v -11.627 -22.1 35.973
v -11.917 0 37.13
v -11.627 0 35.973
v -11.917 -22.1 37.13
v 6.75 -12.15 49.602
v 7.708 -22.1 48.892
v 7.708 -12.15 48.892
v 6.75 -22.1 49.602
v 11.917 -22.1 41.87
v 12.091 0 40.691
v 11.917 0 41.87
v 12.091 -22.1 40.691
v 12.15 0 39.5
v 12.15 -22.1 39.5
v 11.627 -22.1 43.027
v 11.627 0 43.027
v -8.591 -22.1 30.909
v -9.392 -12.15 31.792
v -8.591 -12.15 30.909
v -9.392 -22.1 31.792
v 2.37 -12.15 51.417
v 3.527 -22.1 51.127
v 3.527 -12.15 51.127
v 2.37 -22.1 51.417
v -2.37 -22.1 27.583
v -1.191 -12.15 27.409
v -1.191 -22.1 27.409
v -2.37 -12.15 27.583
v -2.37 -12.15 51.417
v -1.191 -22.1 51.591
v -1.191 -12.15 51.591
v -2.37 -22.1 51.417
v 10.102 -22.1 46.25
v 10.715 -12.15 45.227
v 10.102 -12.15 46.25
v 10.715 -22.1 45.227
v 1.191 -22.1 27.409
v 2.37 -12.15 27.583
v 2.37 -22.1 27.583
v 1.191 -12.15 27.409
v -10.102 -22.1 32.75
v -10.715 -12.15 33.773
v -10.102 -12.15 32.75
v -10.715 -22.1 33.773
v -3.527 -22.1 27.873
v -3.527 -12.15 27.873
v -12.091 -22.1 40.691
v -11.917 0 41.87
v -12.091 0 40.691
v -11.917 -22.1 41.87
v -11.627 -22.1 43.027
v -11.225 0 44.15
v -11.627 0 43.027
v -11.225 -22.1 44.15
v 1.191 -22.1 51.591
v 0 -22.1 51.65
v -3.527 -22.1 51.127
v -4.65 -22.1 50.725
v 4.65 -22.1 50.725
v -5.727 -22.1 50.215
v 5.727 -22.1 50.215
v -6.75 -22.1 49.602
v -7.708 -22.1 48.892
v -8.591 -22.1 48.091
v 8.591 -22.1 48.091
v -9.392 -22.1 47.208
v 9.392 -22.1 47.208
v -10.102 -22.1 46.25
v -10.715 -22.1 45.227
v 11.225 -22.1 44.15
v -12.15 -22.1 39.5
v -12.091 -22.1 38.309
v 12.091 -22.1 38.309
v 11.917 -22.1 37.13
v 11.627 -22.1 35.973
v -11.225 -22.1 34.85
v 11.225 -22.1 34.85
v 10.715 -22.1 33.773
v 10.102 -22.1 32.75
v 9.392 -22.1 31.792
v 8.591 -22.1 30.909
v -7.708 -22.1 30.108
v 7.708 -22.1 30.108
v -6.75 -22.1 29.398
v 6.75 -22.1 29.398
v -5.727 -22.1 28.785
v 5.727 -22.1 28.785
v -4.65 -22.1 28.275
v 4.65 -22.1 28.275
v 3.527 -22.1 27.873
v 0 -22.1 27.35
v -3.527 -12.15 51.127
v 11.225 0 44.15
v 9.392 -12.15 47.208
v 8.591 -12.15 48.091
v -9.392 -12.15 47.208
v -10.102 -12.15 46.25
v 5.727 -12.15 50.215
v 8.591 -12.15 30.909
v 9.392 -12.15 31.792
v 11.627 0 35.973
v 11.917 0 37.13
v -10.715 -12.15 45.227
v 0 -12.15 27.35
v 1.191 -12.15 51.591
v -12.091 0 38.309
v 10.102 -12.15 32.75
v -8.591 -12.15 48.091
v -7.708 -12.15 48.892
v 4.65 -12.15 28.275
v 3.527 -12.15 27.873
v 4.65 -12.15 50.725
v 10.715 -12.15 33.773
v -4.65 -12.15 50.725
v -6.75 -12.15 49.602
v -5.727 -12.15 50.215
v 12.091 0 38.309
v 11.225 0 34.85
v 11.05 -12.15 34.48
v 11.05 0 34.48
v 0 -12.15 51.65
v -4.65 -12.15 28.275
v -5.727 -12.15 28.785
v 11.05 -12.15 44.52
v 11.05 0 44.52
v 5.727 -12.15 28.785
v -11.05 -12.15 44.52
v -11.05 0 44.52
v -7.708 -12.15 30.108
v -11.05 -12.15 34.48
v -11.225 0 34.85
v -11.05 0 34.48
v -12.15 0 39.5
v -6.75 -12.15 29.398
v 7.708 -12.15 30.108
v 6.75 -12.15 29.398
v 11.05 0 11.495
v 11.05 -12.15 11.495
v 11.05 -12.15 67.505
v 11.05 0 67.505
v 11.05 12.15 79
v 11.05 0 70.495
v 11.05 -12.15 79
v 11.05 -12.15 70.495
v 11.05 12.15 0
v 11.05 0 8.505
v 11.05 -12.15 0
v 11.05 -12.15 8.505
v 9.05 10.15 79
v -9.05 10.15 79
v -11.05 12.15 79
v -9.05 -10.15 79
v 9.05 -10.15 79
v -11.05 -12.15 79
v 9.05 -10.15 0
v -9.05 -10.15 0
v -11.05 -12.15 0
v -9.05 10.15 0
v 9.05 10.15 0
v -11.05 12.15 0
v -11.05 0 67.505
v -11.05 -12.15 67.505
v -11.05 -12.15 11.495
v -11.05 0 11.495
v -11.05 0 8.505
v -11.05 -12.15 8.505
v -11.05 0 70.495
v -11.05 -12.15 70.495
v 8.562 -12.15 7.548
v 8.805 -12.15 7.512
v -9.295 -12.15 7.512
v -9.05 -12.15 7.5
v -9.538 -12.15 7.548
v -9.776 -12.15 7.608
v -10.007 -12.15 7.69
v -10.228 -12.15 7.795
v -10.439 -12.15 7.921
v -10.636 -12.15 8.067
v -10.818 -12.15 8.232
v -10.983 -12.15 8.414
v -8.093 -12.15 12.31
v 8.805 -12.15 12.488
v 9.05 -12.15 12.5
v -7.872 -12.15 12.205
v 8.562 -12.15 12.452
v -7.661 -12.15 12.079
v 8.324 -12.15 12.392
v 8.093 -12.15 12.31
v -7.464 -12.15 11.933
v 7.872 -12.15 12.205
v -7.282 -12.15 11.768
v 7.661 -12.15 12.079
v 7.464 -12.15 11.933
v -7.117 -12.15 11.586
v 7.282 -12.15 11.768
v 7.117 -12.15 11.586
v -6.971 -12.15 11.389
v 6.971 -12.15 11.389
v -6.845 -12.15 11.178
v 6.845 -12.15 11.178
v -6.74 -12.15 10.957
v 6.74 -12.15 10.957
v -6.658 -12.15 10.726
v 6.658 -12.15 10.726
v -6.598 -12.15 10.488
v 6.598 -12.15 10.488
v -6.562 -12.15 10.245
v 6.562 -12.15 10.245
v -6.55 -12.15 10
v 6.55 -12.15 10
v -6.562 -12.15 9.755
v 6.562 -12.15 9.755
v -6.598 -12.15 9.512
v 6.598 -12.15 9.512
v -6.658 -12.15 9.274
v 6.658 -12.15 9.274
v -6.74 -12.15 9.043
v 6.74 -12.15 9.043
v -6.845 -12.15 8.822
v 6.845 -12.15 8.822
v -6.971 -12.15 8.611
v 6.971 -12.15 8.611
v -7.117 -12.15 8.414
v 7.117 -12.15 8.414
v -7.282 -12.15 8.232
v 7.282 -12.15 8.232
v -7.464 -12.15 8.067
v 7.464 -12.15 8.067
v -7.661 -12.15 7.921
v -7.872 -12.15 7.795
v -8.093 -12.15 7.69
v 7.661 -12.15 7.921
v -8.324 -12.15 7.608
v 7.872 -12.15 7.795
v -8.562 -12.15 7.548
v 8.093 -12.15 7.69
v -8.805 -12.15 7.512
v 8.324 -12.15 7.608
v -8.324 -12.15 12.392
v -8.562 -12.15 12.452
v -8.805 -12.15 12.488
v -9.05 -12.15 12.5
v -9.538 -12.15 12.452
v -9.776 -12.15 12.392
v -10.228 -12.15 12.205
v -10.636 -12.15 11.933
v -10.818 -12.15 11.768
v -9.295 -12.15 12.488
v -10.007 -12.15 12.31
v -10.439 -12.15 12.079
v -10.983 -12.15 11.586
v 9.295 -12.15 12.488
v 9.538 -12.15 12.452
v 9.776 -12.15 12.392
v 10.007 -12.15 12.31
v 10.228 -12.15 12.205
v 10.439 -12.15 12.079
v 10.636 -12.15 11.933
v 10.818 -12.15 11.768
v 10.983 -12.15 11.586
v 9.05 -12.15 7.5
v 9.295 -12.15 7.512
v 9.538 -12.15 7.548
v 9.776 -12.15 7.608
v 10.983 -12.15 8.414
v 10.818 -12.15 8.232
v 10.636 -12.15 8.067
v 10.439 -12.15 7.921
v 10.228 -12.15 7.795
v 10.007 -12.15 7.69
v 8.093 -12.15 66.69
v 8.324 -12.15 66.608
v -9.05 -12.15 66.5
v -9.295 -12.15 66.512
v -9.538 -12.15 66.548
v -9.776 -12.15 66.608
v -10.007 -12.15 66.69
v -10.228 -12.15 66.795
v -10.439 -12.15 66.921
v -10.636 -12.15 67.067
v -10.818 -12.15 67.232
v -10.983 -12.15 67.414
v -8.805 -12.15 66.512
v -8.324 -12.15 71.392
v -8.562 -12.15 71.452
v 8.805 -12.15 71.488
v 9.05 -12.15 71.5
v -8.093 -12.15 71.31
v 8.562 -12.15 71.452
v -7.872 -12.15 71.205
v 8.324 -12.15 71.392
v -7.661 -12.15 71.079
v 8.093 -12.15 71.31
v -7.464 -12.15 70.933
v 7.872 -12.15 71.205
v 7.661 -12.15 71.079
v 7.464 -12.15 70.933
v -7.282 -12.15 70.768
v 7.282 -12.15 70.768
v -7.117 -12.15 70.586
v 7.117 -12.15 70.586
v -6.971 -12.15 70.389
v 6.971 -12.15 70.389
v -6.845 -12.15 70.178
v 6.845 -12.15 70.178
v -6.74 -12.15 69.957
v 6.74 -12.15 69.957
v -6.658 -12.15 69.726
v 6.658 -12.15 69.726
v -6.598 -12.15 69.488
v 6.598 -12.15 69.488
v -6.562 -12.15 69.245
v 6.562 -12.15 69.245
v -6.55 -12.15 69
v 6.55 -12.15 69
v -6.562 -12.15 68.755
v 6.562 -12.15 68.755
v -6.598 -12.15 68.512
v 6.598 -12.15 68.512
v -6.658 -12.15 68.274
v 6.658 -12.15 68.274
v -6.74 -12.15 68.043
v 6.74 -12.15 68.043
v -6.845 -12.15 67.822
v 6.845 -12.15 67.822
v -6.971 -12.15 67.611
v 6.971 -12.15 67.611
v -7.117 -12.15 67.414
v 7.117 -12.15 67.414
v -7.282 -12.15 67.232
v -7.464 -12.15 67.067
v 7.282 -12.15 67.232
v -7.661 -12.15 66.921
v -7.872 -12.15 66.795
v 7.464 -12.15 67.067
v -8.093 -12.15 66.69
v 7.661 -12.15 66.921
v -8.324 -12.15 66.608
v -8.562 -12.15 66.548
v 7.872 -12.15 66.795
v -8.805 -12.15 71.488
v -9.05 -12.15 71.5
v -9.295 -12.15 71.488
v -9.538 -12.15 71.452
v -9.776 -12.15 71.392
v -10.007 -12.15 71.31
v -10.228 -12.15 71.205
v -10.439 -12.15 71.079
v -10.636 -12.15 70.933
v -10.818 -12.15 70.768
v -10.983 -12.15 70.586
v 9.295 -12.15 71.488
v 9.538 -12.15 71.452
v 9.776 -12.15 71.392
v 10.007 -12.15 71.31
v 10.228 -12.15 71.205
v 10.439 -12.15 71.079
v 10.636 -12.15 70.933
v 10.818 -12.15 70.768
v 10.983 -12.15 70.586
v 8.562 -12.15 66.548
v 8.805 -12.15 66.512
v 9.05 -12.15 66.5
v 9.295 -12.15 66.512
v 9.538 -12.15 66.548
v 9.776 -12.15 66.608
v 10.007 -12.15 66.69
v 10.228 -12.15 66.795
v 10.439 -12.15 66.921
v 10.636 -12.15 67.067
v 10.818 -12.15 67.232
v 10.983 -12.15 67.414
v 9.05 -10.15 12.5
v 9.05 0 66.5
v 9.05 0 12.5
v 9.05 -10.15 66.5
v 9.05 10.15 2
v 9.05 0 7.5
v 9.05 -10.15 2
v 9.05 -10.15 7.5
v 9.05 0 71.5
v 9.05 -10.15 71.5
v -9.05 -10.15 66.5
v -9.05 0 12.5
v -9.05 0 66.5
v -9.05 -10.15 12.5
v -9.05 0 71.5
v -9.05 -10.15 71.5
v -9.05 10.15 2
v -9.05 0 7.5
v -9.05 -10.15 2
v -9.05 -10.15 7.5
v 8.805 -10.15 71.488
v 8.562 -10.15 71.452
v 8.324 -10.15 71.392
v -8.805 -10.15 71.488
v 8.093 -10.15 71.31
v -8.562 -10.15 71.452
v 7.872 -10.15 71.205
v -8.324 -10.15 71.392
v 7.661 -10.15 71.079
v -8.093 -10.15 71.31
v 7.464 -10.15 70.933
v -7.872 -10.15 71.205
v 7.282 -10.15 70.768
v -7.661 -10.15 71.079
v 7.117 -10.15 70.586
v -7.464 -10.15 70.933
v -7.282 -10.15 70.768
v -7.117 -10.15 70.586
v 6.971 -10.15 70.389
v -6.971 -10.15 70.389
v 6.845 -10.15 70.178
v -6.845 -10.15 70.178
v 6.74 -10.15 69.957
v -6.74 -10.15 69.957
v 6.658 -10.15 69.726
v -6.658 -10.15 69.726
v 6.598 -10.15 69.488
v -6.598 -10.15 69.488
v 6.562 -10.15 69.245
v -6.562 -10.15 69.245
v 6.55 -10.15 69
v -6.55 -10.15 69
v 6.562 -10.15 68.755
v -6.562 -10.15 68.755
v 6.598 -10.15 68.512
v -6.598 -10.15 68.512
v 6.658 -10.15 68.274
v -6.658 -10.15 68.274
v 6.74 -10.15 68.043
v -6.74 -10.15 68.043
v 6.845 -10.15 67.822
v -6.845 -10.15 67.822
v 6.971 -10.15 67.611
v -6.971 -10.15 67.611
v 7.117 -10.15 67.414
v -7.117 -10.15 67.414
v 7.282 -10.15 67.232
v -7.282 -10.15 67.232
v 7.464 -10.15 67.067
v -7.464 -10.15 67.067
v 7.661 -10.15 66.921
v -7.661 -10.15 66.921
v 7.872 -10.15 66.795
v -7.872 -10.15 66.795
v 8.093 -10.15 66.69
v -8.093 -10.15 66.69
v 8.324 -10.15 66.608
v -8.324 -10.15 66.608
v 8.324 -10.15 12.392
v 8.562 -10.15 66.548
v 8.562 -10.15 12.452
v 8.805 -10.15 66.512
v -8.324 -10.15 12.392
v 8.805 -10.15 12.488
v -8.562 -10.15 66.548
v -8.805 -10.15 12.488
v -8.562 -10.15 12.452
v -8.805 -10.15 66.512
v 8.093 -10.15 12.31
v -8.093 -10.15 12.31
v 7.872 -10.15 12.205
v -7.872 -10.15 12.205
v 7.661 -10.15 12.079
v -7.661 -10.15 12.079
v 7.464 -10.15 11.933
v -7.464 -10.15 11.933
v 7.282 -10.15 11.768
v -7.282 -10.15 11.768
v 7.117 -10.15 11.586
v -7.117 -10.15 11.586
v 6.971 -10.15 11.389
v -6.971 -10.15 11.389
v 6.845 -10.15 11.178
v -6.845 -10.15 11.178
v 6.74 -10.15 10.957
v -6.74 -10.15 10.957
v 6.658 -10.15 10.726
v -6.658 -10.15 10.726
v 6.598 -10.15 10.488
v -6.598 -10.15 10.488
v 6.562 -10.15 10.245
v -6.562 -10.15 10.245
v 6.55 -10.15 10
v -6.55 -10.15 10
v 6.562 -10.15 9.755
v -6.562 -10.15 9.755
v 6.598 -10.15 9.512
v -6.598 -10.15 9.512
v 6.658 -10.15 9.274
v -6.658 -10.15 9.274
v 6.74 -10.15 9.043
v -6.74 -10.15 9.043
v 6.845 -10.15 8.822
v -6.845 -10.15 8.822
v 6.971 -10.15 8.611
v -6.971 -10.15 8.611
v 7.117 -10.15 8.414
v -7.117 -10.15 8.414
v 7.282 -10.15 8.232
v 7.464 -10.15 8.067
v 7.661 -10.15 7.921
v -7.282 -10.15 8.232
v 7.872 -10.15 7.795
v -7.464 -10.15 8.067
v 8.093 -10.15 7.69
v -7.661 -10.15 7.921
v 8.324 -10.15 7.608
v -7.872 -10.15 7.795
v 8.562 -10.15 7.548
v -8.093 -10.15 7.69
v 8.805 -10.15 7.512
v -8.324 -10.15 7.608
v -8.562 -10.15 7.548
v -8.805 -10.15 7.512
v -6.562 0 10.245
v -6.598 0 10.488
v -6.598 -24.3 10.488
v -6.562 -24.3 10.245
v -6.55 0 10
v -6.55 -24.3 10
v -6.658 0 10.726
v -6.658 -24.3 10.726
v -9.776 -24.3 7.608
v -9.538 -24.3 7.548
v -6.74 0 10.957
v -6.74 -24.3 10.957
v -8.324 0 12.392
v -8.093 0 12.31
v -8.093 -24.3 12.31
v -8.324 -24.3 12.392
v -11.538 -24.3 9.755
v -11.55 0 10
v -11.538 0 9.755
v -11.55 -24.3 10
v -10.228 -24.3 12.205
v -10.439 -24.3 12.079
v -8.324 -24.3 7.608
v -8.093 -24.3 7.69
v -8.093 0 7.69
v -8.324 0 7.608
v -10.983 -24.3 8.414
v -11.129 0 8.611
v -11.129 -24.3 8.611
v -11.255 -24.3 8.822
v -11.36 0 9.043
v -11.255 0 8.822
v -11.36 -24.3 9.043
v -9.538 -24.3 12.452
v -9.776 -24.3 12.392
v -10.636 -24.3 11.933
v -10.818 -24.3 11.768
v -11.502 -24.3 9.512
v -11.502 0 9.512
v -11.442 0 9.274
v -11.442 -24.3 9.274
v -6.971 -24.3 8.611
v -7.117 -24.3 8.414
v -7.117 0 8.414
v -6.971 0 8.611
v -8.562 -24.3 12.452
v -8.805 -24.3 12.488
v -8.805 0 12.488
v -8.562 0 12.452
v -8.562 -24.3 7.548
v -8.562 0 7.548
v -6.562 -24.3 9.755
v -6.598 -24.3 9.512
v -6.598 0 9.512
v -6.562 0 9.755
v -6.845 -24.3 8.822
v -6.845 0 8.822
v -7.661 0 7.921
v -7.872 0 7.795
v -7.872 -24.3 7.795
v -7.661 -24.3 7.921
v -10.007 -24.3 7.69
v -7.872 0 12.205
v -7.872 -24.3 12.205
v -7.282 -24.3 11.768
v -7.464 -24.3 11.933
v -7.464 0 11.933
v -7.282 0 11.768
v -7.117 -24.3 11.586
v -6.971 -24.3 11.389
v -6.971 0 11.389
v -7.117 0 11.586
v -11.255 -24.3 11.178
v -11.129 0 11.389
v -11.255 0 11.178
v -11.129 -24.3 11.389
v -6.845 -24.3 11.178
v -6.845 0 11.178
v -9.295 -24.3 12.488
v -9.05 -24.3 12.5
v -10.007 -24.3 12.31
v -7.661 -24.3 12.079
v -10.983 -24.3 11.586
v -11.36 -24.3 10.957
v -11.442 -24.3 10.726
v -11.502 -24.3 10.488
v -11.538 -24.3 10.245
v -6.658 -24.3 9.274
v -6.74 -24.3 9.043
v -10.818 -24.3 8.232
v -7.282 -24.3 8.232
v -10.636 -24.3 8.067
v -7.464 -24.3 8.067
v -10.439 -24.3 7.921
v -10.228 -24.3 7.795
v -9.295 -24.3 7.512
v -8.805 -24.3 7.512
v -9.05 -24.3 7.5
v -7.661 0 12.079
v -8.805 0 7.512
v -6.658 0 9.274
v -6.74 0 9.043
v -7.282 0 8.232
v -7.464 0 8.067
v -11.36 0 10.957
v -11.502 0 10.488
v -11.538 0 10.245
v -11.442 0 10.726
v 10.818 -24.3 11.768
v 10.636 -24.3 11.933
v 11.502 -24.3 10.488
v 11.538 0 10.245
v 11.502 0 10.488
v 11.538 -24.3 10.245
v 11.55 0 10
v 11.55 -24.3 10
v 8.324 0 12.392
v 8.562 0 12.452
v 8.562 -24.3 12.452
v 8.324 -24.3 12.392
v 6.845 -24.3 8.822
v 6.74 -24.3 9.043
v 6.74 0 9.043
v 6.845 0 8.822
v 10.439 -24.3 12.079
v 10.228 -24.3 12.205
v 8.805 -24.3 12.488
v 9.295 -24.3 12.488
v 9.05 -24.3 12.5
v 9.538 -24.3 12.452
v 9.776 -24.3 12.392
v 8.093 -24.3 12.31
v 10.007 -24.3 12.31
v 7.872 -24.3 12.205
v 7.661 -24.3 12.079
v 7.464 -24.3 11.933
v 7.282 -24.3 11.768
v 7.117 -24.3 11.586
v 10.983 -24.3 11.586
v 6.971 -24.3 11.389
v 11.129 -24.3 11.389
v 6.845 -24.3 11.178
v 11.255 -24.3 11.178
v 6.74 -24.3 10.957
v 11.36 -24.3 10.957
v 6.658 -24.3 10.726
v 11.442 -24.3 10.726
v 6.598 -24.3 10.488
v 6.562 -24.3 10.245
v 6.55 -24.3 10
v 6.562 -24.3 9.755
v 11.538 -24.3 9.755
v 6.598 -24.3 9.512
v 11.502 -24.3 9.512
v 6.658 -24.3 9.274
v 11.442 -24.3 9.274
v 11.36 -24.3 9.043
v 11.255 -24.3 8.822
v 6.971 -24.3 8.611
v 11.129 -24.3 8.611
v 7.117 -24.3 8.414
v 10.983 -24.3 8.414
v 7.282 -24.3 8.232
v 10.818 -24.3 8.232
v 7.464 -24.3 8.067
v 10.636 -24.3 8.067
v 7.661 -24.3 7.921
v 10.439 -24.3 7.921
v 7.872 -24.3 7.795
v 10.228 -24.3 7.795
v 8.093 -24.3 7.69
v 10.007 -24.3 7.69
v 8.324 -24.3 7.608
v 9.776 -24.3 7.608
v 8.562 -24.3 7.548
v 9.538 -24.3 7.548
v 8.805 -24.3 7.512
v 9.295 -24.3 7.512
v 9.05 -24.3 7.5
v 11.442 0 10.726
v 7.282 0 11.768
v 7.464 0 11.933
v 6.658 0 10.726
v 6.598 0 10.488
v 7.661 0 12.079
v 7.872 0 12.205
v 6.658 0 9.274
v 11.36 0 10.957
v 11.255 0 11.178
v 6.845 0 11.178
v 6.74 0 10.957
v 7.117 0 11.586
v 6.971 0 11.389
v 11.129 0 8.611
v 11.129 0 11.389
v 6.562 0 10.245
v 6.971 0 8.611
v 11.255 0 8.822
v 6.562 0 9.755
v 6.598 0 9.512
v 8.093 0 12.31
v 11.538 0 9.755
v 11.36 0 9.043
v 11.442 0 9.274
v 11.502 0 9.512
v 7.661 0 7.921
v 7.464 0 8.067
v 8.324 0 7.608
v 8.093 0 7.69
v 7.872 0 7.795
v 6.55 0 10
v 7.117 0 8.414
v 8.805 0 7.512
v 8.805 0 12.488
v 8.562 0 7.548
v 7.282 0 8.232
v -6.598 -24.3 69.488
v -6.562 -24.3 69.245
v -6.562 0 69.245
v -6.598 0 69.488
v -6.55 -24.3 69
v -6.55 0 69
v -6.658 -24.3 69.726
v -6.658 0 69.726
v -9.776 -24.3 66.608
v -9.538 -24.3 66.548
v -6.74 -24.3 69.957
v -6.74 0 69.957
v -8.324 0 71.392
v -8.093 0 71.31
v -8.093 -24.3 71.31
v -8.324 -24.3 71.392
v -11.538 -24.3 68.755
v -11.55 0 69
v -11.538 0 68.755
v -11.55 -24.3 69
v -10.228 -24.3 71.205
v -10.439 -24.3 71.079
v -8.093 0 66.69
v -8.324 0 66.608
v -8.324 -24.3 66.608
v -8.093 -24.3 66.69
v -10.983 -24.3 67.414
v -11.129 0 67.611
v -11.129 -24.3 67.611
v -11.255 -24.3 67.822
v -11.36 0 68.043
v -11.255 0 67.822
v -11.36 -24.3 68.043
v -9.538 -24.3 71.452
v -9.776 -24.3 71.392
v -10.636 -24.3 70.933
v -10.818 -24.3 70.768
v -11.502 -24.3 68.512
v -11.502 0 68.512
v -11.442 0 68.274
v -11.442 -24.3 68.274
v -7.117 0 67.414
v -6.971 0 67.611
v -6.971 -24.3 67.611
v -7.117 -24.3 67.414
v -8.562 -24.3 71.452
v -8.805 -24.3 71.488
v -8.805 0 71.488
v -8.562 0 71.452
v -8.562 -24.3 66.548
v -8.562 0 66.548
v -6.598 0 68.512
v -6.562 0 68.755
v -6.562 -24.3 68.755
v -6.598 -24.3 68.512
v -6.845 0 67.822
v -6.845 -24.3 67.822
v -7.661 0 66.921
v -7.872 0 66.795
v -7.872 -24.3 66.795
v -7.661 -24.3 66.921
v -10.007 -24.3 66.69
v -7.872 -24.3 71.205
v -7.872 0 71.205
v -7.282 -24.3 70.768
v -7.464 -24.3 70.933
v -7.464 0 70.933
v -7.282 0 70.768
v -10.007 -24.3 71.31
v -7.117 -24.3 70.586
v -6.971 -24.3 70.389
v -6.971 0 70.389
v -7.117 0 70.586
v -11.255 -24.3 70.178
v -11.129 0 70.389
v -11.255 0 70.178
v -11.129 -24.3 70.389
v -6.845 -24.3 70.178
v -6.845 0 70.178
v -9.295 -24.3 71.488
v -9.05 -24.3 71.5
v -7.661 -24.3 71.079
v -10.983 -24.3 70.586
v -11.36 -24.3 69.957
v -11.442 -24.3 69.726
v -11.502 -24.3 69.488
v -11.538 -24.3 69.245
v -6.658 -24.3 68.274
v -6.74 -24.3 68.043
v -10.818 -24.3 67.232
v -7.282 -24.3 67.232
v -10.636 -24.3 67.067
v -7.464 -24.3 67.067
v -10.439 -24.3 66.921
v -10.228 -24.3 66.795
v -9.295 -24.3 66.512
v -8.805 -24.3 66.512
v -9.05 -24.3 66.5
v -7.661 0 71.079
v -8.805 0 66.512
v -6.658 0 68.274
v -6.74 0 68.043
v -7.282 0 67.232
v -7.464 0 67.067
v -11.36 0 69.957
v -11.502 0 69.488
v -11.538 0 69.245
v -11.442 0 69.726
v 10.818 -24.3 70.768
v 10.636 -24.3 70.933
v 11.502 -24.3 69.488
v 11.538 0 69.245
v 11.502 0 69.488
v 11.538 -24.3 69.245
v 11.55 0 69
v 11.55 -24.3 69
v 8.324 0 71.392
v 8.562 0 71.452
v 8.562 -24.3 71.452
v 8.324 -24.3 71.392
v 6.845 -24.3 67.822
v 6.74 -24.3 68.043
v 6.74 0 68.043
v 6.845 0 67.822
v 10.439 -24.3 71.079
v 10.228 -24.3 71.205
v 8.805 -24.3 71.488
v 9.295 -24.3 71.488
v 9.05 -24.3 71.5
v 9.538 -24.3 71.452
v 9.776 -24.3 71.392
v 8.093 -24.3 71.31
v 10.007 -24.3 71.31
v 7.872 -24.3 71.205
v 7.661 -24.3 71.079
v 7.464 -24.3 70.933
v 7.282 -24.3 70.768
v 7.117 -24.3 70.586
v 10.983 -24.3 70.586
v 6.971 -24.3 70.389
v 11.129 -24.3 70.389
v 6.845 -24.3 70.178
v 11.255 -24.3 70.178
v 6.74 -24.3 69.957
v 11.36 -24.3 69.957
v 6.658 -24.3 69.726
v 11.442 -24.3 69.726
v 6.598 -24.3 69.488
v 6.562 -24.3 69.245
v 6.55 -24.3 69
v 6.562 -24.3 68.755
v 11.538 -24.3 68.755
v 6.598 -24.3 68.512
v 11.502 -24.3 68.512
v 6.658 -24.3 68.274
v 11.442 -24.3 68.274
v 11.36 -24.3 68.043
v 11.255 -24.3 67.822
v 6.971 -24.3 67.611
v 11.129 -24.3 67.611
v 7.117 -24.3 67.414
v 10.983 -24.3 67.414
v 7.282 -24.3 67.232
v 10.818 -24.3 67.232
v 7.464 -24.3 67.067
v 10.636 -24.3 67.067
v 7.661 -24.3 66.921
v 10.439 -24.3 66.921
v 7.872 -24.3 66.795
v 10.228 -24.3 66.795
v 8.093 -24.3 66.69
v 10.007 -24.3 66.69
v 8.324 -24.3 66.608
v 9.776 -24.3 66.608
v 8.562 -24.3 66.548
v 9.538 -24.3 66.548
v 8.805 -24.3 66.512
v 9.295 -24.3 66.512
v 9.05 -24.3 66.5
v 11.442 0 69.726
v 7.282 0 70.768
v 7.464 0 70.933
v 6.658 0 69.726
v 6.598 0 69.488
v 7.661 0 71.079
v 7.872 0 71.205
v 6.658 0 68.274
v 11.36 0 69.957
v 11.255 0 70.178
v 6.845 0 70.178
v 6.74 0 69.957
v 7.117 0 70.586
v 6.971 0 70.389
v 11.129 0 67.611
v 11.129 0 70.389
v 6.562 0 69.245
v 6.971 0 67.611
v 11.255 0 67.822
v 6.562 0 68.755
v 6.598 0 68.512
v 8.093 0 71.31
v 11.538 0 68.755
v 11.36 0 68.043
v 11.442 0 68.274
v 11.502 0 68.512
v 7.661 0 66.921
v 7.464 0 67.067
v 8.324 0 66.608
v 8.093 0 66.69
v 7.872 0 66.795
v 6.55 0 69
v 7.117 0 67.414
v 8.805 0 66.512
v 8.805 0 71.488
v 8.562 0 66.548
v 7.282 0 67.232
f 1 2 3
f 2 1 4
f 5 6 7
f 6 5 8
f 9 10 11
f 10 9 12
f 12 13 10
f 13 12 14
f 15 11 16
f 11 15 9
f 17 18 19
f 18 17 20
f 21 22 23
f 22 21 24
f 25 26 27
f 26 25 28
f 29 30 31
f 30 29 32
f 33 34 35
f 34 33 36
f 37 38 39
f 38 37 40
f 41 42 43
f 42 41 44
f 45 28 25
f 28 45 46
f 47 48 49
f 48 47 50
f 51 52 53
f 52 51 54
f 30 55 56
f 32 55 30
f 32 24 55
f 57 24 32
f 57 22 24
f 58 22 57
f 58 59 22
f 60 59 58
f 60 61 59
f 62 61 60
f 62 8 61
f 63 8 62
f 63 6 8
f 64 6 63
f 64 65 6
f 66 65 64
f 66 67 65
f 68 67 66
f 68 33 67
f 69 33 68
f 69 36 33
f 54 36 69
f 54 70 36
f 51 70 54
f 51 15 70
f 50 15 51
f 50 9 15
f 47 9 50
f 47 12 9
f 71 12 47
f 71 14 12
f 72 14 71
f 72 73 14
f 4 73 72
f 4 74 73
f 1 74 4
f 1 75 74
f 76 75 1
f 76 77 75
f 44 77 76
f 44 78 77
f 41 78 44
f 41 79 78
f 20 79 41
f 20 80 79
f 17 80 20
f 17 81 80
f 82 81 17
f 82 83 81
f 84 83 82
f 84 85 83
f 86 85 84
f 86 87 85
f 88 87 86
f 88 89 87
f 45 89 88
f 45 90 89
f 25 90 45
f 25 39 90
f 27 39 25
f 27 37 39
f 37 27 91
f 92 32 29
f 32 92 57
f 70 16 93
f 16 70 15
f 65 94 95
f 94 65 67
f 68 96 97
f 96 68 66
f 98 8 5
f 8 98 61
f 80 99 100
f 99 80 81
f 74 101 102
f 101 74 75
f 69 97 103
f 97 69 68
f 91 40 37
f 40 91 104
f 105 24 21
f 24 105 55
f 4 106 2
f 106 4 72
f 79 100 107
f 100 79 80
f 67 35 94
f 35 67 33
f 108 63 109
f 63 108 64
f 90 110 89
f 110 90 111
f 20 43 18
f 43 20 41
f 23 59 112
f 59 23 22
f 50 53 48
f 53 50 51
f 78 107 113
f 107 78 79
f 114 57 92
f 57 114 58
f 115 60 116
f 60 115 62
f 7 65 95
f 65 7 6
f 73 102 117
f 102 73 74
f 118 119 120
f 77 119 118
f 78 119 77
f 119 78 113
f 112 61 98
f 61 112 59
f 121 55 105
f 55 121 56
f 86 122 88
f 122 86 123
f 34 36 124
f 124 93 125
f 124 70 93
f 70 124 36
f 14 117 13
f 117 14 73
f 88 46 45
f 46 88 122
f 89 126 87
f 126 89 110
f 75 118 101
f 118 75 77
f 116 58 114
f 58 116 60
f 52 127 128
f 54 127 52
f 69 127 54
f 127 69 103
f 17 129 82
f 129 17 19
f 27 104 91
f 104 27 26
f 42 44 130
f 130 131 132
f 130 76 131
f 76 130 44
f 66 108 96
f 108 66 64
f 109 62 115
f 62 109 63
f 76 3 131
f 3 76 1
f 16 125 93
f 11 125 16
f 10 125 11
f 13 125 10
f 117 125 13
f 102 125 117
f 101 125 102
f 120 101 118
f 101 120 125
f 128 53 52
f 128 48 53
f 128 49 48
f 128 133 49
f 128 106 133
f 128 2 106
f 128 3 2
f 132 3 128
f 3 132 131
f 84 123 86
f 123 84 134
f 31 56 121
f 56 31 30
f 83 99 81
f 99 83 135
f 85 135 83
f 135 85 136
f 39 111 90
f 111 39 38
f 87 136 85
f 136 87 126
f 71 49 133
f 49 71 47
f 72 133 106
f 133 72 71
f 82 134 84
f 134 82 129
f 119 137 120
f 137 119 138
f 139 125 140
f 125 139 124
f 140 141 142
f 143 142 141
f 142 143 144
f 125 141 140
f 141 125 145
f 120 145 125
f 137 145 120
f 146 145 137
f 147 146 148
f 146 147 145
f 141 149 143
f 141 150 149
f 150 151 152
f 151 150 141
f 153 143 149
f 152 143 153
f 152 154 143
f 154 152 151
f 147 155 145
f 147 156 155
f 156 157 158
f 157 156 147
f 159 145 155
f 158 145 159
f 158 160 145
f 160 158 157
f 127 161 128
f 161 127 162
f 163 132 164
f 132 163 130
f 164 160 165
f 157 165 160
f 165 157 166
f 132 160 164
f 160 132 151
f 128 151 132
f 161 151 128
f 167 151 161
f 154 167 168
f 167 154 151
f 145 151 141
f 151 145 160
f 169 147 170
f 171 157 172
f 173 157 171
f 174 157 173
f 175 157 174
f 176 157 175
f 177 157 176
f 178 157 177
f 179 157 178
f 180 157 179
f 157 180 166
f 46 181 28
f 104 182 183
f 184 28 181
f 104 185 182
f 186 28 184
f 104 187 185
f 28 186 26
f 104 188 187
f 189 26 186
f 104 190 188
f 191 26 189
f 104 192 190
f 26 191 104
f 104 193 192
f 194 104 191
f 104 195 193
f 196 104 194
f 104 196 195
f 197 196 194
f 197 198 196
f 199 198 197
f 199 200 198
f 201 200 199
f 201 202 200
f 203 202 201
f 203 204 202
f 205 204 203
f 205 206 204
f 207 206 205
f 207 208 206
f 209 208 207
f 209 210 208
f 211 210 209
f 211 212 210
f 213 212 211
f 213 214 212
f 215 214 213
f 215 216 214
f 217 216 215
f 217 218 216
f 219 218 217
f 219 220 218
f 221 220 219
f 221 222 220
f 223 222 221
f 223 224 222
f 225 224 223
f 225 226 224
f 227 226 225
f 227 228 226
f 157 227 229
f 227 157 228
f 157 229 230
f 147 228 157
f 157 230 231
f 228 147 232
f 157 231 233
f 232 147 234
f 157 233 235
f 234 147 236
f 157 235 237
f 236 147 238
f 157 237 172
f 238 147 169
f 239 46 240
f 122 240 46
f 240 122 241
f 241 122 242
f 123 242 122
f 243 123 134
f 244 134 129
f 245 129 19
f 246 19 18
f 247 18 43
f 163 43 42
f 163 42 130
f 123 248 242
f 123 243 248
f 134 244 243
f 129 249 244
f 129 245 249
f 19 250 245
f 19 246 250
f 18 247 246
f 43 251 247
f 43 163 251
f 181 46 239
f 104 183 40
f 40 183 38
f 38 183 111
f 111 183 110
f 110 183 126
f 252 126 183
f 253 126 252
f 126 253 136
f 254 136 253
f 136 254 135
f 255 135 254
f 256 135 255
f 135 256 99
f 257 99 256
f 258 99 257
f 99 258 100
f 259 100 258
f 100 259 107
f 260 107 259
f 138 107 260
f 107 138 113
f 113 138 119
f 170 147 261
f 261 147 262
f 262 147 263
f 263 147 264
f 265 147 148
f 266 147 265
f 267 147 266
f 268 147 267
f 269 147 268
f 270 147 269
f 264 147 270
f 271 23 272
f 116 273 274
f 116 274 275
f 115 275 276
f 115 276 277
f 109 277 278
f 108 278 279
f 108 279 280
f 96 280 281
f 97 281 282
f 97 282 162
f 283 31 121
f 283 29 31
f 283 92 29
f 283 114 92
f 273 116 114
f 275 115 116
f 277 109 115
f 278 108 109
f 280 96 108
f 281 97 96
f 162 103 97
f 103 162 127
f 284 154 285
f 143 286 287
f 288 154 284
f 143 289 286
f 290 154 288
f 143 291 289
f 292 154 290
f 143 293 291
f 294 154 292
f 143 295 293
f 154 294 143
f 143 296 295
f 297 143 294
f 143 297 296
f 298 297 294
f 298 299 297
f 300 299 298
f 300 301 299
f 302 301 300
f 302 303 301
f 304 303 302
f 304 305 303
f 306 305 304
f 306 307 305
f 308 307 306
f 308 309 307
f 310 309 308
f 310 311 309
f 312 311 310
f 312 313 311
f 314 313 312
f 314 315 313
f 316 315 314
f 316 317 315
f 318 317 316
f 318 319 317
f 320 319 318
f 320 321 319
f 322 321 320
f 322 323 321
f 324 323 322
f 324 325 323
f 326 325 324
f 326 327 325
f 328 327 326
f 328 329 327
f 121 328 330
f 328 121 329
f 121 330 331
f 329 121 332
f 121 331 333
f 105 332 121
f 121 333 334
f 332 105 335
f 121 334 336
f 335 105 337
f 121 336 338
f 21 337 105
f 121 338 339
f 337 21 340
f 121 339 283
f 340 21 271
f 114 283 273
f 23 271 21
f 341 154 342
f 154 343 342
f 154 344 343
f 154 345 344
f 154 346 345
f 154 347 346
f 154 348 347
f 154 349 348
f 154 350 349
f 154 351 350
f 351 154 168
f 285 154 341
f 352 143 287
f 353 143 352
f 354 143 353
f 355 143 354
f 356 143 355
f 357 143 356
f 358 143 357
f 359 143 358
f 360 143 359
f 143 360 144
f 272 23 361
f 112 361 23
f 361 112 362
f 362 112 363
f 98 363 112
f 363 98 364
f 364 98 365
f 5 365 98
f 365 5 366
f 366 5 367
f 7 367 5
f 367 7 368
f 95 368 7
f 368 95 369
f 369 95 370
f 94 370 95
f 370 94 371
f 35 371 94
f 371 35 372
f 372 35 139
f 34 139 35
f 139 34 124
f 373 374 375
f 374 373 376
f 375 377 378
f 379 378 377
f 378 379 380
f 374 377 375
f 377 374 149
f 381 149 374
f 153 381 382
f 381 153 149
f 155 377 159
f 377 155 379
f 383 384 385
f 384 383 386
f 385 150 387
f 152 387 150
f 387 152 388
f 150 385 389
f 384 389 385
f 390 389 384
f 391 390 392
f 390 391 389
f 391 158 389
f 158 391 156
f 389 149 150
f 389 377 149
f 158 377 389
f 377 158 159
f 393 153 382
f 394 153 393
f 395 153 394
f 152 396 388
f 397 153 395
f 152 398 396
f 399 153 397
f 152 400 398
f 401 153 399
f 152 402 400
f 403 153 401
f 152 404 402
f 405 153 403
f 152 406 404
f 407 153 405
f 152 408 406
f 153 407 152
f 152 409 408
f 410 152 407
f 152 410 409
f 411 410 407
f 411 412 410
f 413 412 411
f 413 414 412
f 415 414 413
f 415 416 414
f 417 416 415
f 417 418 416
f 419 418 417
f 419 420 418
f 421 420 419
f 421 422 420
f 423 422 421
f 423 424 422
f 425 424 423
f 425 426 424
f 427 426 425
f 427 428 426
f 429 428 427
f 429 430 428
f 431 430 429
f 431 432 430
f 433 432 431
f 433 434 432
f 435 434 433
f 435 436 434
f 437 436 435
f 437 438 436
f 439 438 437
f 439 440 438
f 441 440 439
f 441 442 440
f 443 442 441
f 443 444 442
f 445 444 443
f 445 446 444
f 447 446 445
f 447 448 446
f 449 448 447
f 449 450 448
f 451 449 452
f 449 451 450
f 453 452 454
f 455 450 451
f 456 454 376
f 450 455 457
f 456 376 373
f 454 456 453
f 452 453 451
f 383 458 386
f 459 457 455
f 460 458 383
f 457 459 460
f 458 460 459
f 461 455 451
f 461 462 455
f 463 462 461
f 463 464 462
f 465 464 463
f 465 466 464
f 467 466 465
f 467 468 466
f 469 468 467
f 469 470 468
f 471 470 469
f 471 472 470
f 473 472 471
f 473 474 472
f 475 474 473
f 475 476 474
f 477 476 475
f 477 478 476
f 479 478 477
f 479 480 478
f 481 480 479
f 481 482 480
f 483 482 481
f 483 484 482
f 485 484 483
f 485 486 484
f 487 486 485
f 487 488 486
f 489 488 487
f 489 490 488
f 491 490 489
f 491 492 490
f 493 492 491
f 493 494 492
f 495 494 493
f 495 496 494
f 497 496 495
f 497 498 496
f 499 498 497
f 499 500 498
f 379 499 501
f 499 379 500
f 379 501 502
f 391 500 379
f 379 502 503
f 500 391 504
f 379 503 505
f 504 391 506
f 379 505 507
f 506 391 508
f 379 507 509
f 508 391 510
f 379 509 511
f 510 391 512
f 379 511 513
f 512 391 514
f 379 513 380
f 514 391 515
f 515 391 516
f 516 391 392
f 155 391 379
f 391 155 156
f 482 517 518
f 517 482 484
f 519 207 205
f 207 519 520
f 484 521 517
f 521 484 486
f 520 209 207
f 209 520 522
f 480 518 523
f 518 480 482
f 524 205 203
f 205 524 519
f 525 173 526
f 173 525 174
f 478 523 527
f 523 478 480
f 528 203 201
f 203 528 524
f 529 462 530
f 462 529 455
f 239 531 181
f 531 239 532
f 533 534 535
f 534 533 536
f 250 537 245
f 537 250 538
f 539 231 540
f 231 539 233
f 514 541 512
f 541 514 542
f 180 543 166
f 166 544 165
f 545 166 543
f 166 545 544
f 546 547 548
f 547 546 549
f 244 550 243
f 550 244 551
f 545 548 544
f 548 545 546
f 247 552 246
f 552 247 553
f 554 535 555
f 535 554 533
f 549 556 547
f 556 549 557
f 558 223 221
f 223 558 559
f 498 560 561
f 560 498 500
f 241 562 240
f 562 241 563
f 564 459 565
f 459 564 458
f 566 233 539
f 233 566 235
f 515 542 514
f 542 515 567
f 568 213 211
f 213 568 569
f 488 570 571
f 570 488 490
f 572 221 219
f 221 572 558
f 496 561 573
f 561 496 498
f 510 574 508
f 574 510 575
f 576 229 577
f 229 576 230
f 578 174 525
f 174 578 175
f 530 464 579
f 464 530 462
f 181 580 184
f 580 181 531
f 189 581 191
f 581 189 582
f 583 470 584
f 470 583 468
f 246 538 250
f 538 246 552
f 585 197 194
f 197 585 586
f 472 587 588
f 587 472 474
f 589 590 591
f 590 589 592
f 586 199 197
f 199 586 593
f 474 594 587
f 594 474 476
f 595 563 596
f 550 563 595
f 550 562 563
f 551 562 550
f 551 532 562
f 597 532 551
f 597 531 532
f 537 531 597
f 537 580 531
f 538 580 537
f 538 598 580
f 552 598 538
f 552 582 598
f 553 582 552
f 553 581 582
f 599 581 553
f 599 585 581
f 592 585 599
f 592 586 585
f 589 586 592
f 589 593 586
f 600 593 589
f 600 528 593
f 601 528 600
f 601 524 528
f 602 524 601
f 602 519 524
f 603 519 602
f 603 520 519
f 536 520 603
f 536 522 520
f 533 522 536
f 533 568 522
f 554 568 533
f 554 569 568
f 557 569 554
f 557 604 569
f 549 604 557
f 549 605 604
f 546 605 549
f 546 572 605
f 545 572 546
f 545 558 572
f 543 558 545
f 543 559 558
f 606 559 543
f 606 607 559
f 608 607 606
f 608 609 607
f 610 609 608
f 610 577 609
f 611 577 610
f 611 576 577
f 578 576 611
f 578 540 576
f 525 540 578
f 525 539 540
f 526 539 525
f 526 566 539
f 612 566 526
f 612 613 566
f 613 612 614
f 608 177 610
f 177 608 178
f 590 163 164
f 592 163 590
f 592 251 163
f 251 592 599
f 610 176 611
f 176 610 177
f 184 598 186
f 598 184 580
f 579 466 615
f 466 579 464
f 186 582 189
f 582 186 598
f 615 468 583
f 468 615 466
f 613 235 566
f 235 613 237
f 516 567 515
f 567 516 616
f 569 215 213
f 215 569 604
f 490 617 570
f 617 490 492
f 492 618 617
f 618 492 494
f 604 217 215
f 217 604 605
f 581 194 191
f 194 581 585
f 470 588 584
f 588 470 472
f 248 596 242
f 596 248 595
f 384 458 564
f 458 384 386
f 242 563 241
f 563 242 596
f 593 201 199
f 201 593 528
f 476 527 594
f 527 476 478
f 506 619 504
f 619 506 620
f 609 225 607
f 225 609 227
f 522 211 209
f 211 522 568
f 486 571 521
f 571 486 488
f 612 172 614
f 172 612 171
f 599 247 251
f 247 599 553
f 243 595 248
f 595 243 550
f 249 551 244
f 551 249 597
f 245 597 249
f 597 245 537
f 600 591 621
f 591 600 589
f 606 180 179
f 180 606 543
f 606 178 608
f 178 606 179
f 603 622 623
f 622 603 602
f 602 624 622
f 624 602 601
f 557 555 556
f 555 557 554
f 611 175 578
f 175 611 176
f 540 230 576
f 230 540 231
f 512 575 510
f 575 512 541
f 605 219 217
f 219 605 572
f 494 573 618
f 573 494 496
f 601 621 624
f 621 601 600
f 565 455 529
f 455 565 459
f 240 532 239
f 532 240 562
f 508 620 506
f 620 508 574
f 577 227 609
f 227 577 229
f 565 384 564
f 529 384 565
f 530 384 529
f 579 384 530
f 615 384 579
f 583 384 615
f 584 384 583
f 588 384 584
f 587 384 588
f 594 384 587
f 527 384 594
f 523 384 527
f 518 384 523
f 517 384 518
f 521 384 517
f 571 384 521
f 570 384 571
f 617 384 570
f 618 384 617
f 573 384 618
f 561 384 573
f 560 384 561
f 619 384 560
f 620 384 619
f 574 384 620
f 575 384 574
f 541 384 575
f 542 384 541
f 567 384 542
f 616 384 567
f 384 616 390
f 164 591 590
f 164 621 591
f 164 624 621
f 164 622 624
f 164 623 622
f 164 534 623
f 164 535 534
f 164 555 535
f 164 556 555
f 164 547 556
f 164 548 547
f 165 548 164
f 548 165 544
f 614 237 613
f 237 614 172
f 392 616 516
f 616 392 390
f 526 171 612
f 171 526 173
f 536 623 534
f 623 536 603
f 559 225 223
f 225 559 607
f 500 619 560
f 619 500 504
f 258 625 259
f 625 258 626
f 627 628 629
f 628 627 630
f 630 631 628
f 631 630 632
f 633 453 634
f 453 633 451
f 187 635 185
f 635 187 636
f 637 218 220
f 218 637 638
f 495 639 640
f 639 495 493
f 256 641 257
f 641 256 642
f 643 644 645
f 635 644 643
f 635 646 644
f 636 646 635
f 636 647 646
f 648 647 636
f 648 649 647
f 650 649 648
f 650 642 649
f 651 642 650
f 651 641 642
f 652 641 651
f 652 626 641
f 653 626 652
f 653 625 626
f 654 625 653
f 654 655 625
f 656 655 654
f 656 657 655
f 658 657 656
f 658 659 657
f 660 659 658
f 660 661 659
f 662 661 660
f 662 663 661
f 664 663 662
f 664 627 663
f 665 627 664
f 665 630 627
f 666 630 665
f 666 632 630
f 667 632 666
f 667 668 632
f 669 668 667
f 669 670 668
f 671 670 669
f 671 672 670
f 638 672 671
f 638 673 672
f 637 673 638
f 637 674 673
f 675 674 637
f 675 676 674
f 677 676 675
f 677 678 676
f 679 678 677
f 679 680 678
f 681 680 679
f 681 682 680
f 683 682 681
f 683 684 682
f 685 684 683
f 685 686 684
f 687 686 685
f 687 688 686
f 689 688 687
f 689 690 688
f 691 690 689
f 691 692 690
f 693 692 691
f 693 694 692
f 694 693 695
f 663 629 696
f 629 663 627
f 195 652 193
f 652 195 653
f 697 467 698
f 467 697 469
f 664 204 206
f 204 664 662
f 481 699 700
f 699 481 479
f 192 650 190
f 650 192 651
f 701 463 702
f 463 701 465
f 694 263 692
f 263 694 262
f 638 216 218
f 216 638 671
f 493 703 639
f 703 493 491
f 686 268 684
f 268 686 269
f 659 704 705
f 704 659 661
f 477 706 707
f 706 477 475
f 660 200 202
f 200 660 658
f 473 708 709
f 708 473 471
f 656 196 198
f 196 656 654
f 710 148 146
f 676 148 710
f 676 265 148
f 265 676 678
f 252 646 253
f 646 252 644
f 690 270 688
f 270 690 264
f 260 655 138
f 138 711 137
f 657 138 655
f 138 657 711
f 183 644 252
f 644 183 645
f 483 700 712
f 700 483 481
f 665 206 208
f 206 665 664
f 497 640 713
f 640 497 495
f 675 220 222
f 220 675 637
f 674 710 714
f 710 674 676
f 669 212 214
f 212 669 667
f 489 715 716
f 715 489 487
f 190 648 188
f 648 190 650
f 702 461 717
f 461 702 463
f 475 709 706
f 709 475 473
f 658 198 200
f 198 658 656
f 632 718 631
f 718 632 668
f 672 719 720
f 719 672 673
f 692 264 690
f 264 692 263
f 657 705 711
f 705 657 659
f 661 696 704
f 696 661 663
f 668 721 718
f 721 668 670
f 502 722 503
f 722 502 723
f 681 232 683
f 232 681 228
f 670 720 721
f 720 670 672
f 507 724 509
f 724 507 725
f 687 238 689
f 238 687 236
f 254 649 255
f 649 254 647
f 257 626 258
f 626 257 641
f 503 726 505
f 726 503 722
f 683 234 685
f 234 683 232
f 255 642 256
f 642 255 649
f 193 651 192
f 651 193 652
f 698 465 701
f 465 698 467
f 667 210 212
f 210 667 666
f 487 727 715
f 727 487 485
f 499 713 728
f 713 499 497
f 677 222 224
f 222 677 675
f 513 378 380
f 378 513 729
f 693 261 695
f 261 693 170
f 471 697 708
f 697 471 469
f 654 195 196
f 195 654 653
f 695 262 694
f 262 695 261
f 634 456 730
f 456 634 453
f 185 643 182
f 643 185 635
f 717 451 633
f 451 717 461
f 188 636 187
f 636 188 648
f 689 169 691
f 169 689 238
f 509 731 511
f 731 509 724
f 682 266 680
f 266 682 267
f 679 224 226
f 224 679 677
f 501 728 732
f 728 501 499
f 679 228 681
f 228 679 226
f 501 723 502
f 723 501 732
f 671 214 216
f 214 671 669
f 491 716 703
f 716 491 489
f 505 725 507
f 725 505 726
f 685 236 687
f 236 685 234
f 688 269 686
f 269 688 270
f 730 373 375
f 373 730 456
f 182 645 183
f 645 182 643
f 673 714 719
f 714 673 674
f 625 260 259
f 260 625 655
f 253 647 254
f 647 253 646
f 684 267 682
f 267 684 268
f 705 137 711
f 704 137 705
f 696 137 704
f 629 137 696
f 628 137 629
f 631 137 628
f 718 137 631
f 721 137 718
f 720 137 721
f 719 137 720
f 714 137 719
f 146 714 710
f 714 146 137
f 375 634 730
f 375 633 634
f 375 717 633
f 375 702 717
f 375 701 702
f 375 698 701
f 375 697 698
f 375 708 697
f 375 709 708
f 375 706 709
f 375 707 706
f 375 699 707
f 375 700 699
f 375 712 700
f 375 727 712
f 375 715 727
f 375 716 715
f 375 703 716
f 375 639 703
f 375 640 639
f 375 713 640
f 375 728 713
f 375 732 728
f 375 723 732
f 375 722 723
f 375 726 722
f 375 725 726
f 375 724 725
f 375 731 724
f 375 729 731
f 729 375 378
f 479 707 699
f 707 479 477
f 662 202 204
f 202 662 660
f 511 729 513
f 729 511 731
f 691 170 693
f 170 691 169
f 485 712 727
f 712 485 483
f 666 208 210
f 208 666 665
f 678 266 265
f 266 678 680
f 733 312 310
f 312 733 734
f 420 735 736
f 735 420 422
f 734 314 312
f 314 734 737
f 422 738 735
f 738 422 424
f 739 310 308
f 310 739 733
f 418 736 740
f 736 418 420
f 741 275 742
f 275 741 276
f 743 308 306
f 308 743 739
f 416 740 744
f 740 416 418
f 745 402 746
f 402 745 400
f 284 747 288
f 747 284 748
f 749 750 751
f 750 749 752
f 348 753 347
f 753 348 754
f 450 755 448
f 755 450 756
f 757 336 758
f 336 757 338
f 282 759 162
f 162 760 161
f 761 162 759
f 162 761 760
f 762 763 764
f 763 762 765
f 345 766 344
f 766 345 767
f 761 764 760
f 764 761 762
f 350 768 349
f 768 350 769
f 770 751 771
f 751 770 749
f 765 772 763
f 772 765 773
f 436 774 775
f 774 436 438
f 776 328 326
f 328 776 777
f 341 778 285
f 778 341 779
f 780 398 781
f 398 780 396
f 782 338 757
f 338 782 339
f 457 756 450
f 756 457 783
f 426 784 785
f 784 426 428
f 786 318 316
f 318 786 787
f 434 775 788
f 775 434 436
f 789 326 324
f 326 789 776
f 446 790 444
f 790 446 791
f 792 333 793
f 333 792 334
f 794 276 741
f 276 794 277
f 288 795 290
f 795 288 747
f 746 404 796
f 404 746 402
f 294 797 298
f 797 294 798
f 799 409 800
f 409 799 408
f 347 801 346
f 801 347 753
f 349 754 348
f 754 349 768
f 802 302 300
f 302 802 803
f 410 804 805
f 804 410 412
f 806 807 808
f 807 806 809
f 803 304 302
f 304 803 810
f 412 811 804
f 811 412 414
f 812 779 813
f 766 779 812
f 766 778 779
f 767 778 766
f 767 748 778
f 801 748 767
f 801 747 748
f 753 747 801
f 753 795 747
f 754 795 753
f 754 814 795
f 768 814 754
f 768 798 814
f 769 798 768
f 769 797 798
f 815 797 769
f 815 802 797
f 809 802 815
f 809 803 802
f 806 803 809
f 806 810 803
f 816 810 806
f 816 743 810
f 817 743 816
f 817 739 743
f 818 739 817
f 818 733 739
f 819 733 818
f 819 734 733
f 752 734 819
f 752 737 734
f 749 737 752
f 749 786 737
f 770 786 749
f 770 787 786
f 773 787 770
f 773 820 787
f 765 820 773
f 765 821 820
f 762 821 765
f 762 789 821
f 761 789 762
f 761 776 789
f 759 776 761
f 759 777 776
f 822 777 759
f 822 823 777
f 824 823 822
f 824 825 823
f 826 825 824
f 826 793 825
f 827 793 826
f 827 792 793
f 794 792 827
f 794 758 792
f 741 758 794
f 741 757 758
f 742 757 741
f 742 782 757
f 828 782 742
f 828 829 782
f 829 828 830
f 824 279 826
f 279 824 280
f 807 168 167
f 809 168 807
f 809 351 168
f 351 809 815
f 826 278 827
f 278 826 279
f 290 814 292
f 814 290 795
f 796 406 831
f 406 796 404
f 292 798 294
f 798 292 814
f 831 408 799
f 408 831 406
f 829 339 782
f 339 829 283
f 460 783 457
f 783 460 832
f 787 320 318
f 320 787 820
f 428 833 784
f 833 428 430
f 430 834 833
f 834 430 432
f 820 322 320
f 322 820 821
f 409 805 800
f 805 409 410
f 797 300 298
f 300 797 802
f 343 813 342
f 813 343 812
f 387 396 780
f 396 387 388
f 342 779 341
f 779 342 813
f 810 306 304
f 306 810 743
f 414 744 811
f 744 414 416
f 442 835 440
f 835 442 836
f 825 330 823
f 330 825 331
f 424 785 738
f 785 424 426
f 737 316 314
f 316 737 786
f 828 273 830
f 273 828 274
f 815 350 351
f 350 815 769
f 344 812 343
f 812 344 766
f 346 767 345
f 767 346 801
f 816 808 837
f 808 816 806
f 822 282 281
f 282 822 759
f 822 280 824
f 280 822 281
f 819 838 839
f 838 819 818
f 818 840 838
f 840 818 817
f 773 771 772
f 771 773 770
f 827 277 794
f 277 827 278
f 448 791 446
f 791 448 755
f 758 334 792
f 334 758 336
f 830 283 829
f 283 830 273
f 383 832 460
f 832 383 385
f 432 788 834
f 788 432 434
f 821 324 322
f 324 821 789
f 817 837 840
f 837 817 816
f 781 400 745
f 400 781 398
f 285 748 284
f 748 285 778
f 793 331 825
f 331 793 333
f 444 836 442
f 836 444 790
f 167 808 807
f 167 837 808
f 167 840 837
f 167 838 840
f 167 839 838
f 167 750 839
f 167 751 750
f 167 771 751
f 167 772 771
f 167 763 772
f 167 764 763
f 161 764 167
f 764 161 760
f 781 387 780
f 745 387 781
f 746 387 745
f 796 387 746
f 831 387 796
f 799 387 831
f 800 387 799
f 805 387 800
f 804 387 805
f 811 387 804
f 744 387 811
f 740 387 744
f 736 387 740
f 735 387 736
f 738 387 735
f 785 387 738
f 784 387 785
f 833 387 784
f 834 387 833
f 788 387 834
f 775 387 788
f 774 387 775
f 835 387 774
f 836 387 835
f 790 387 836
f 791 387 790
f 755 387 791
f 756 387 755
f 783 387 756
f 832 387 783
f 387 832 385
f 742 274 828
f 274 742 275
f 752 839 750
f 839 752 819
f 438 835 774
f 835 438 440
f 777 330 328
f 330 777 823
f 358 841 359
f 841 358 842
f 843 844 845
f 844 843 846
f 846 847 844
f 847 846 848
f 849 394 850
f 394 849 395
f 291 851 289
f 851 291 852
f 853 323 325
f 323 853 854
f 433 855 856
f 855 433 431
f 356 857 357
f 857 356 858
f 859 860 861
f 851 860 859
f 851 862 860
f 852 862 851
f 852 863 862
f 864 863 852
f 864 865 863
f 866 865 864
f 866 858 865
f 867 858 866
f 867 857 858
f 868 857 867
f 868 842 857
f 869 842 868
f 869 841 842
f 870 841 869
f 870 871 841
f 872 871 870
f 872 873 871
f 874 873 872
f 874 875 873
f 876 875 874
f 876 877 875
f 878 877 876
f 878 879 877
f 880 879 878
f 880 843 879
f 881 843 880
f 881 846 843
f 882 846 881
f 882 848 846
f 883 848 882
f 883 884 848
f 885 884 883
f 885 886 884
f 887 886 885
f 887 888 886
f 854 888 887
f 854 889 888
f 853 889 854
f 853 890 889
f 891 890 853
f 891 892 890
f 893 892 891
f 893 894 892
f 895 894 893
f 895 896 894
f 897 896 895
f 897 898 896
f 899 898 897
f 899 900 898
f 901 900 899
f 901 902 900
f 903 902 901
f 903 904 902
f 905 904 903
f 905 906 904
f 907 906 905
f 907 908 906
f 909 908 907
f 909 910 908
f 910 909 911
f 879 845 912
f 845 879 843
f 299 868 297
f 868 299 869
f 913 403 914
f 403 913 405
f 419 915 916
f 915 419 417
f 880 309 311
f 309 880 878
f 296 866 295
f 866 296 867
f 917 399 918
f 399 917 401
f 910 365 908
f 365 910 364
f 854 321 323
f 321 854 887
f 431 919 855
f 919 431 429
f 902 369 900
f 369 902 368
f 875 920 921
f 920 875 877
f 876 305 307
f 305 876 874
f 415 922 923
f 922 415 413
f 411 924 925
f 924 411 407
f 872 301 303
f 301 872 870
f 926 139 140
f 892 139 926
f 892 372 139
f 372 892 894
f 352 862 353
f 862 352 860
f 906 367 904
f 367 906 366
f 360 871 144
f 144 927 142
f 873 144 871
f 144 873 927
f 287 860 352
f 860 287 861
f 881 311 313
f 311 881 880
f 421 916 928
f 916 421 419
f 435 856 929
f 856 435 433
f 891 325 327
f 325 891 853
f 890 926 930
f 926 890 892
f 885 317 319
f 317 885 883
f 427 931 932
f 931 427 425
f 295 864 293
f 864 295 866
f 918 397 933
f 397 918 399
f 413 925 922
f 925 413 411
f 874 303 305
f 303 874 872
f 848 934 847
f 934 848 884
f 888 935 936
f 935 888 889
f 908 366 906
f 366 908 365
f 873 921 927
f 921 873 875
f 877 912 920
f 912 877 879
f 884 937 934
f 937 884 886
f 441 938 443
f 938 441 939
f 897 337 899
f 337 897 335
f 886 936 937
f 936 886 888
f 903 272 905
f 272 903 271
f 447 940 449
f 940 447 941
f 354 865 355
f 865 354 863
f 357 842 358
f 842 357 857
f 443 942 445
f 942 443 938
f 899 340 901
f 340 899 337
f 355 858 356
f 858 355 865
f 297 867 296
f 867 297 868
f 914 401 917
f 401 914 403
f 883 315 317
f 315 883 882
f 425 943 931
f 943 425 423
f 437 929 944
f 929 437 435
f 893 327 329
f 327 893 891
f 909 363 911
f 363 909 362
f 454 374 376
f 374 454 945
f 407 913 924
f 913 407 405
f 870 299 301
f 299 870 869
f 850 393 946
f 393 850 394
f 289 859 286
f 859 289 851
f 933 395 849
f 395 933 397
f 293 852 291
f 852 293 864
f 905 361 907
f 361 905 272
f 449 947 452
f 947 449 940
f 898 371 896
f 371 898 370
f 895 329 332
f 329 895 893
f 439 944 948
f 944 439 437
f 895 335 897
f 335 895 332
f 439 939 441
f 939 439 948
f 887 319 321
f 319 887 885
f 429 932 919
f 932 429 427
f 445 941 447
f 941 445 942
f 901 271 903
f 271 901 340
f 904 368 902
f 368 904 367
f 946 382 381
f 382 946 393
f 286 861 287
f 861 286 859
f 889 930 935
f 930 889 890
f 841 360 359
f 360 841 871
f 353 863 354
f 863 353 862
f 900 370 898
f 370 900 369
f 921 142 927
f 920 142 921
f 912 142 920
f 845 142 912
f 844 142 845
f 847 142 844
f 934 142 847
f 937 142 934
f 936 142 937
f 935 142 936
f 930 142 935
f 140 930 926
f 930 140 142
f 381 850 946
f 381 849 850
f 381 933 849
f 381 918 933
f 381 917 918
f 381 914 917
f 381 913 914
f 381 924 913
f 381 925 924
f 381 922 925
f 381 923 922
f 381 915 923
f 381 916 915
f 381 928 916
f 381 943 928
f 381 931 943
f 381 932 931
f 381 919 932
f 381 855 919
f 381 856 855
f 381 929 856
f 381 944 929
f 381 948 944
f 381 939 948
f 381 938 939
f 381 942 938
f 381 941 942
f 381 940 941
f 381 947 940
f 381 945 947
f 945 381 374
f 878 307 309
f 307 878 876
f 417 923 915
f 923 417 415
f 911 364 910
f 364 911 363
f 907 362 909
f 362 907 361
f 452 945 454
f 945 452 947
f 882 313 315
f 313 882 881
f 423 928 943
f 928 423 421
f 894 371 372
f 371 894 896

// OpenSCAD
module u_shaped_bracket() {
    difference() {
        // Main U-shaped body
        union() {
            // Rounded back
            translate([0, 0, 39.5])
                rotate([90, 0, 0])
                cylinder(h=22.1, r=12.15, $fn=64);
            // Side walls
            translate([-11.05, -12.15, 0])
                cube([22.1, 24.3, 79.0]);
        }
        // Internal channel
        translate([-9.05, -10.15, 0])
            cube([18.1, 20.3, 79.0]);
    }
    
    // Internal cylindrical bosses/holes
    module internal_boss(x, z) {
        translate([x, 0, z])
            rotate([90, 0, 0])
            cylinder(h=24.3, r=2.5, $fn=64);
    }
    
    // Add bosses/holes
    internal_boss(-9.05, 10);
    internal_boss(9.05, 10);
    internal_boss(-9.05, 69);
    internal_boss(9.05, 69);
    
    // Front-edge tabs/lips
    module front_tab(x) {
        translate([x, -12.15, 0])
            cube([2, 24.3, 2]);
    }
    
    // Add tabs/lips
    front_tab(-11.05);
    front_tab(9.05);
}

u_shaped_bracket();
